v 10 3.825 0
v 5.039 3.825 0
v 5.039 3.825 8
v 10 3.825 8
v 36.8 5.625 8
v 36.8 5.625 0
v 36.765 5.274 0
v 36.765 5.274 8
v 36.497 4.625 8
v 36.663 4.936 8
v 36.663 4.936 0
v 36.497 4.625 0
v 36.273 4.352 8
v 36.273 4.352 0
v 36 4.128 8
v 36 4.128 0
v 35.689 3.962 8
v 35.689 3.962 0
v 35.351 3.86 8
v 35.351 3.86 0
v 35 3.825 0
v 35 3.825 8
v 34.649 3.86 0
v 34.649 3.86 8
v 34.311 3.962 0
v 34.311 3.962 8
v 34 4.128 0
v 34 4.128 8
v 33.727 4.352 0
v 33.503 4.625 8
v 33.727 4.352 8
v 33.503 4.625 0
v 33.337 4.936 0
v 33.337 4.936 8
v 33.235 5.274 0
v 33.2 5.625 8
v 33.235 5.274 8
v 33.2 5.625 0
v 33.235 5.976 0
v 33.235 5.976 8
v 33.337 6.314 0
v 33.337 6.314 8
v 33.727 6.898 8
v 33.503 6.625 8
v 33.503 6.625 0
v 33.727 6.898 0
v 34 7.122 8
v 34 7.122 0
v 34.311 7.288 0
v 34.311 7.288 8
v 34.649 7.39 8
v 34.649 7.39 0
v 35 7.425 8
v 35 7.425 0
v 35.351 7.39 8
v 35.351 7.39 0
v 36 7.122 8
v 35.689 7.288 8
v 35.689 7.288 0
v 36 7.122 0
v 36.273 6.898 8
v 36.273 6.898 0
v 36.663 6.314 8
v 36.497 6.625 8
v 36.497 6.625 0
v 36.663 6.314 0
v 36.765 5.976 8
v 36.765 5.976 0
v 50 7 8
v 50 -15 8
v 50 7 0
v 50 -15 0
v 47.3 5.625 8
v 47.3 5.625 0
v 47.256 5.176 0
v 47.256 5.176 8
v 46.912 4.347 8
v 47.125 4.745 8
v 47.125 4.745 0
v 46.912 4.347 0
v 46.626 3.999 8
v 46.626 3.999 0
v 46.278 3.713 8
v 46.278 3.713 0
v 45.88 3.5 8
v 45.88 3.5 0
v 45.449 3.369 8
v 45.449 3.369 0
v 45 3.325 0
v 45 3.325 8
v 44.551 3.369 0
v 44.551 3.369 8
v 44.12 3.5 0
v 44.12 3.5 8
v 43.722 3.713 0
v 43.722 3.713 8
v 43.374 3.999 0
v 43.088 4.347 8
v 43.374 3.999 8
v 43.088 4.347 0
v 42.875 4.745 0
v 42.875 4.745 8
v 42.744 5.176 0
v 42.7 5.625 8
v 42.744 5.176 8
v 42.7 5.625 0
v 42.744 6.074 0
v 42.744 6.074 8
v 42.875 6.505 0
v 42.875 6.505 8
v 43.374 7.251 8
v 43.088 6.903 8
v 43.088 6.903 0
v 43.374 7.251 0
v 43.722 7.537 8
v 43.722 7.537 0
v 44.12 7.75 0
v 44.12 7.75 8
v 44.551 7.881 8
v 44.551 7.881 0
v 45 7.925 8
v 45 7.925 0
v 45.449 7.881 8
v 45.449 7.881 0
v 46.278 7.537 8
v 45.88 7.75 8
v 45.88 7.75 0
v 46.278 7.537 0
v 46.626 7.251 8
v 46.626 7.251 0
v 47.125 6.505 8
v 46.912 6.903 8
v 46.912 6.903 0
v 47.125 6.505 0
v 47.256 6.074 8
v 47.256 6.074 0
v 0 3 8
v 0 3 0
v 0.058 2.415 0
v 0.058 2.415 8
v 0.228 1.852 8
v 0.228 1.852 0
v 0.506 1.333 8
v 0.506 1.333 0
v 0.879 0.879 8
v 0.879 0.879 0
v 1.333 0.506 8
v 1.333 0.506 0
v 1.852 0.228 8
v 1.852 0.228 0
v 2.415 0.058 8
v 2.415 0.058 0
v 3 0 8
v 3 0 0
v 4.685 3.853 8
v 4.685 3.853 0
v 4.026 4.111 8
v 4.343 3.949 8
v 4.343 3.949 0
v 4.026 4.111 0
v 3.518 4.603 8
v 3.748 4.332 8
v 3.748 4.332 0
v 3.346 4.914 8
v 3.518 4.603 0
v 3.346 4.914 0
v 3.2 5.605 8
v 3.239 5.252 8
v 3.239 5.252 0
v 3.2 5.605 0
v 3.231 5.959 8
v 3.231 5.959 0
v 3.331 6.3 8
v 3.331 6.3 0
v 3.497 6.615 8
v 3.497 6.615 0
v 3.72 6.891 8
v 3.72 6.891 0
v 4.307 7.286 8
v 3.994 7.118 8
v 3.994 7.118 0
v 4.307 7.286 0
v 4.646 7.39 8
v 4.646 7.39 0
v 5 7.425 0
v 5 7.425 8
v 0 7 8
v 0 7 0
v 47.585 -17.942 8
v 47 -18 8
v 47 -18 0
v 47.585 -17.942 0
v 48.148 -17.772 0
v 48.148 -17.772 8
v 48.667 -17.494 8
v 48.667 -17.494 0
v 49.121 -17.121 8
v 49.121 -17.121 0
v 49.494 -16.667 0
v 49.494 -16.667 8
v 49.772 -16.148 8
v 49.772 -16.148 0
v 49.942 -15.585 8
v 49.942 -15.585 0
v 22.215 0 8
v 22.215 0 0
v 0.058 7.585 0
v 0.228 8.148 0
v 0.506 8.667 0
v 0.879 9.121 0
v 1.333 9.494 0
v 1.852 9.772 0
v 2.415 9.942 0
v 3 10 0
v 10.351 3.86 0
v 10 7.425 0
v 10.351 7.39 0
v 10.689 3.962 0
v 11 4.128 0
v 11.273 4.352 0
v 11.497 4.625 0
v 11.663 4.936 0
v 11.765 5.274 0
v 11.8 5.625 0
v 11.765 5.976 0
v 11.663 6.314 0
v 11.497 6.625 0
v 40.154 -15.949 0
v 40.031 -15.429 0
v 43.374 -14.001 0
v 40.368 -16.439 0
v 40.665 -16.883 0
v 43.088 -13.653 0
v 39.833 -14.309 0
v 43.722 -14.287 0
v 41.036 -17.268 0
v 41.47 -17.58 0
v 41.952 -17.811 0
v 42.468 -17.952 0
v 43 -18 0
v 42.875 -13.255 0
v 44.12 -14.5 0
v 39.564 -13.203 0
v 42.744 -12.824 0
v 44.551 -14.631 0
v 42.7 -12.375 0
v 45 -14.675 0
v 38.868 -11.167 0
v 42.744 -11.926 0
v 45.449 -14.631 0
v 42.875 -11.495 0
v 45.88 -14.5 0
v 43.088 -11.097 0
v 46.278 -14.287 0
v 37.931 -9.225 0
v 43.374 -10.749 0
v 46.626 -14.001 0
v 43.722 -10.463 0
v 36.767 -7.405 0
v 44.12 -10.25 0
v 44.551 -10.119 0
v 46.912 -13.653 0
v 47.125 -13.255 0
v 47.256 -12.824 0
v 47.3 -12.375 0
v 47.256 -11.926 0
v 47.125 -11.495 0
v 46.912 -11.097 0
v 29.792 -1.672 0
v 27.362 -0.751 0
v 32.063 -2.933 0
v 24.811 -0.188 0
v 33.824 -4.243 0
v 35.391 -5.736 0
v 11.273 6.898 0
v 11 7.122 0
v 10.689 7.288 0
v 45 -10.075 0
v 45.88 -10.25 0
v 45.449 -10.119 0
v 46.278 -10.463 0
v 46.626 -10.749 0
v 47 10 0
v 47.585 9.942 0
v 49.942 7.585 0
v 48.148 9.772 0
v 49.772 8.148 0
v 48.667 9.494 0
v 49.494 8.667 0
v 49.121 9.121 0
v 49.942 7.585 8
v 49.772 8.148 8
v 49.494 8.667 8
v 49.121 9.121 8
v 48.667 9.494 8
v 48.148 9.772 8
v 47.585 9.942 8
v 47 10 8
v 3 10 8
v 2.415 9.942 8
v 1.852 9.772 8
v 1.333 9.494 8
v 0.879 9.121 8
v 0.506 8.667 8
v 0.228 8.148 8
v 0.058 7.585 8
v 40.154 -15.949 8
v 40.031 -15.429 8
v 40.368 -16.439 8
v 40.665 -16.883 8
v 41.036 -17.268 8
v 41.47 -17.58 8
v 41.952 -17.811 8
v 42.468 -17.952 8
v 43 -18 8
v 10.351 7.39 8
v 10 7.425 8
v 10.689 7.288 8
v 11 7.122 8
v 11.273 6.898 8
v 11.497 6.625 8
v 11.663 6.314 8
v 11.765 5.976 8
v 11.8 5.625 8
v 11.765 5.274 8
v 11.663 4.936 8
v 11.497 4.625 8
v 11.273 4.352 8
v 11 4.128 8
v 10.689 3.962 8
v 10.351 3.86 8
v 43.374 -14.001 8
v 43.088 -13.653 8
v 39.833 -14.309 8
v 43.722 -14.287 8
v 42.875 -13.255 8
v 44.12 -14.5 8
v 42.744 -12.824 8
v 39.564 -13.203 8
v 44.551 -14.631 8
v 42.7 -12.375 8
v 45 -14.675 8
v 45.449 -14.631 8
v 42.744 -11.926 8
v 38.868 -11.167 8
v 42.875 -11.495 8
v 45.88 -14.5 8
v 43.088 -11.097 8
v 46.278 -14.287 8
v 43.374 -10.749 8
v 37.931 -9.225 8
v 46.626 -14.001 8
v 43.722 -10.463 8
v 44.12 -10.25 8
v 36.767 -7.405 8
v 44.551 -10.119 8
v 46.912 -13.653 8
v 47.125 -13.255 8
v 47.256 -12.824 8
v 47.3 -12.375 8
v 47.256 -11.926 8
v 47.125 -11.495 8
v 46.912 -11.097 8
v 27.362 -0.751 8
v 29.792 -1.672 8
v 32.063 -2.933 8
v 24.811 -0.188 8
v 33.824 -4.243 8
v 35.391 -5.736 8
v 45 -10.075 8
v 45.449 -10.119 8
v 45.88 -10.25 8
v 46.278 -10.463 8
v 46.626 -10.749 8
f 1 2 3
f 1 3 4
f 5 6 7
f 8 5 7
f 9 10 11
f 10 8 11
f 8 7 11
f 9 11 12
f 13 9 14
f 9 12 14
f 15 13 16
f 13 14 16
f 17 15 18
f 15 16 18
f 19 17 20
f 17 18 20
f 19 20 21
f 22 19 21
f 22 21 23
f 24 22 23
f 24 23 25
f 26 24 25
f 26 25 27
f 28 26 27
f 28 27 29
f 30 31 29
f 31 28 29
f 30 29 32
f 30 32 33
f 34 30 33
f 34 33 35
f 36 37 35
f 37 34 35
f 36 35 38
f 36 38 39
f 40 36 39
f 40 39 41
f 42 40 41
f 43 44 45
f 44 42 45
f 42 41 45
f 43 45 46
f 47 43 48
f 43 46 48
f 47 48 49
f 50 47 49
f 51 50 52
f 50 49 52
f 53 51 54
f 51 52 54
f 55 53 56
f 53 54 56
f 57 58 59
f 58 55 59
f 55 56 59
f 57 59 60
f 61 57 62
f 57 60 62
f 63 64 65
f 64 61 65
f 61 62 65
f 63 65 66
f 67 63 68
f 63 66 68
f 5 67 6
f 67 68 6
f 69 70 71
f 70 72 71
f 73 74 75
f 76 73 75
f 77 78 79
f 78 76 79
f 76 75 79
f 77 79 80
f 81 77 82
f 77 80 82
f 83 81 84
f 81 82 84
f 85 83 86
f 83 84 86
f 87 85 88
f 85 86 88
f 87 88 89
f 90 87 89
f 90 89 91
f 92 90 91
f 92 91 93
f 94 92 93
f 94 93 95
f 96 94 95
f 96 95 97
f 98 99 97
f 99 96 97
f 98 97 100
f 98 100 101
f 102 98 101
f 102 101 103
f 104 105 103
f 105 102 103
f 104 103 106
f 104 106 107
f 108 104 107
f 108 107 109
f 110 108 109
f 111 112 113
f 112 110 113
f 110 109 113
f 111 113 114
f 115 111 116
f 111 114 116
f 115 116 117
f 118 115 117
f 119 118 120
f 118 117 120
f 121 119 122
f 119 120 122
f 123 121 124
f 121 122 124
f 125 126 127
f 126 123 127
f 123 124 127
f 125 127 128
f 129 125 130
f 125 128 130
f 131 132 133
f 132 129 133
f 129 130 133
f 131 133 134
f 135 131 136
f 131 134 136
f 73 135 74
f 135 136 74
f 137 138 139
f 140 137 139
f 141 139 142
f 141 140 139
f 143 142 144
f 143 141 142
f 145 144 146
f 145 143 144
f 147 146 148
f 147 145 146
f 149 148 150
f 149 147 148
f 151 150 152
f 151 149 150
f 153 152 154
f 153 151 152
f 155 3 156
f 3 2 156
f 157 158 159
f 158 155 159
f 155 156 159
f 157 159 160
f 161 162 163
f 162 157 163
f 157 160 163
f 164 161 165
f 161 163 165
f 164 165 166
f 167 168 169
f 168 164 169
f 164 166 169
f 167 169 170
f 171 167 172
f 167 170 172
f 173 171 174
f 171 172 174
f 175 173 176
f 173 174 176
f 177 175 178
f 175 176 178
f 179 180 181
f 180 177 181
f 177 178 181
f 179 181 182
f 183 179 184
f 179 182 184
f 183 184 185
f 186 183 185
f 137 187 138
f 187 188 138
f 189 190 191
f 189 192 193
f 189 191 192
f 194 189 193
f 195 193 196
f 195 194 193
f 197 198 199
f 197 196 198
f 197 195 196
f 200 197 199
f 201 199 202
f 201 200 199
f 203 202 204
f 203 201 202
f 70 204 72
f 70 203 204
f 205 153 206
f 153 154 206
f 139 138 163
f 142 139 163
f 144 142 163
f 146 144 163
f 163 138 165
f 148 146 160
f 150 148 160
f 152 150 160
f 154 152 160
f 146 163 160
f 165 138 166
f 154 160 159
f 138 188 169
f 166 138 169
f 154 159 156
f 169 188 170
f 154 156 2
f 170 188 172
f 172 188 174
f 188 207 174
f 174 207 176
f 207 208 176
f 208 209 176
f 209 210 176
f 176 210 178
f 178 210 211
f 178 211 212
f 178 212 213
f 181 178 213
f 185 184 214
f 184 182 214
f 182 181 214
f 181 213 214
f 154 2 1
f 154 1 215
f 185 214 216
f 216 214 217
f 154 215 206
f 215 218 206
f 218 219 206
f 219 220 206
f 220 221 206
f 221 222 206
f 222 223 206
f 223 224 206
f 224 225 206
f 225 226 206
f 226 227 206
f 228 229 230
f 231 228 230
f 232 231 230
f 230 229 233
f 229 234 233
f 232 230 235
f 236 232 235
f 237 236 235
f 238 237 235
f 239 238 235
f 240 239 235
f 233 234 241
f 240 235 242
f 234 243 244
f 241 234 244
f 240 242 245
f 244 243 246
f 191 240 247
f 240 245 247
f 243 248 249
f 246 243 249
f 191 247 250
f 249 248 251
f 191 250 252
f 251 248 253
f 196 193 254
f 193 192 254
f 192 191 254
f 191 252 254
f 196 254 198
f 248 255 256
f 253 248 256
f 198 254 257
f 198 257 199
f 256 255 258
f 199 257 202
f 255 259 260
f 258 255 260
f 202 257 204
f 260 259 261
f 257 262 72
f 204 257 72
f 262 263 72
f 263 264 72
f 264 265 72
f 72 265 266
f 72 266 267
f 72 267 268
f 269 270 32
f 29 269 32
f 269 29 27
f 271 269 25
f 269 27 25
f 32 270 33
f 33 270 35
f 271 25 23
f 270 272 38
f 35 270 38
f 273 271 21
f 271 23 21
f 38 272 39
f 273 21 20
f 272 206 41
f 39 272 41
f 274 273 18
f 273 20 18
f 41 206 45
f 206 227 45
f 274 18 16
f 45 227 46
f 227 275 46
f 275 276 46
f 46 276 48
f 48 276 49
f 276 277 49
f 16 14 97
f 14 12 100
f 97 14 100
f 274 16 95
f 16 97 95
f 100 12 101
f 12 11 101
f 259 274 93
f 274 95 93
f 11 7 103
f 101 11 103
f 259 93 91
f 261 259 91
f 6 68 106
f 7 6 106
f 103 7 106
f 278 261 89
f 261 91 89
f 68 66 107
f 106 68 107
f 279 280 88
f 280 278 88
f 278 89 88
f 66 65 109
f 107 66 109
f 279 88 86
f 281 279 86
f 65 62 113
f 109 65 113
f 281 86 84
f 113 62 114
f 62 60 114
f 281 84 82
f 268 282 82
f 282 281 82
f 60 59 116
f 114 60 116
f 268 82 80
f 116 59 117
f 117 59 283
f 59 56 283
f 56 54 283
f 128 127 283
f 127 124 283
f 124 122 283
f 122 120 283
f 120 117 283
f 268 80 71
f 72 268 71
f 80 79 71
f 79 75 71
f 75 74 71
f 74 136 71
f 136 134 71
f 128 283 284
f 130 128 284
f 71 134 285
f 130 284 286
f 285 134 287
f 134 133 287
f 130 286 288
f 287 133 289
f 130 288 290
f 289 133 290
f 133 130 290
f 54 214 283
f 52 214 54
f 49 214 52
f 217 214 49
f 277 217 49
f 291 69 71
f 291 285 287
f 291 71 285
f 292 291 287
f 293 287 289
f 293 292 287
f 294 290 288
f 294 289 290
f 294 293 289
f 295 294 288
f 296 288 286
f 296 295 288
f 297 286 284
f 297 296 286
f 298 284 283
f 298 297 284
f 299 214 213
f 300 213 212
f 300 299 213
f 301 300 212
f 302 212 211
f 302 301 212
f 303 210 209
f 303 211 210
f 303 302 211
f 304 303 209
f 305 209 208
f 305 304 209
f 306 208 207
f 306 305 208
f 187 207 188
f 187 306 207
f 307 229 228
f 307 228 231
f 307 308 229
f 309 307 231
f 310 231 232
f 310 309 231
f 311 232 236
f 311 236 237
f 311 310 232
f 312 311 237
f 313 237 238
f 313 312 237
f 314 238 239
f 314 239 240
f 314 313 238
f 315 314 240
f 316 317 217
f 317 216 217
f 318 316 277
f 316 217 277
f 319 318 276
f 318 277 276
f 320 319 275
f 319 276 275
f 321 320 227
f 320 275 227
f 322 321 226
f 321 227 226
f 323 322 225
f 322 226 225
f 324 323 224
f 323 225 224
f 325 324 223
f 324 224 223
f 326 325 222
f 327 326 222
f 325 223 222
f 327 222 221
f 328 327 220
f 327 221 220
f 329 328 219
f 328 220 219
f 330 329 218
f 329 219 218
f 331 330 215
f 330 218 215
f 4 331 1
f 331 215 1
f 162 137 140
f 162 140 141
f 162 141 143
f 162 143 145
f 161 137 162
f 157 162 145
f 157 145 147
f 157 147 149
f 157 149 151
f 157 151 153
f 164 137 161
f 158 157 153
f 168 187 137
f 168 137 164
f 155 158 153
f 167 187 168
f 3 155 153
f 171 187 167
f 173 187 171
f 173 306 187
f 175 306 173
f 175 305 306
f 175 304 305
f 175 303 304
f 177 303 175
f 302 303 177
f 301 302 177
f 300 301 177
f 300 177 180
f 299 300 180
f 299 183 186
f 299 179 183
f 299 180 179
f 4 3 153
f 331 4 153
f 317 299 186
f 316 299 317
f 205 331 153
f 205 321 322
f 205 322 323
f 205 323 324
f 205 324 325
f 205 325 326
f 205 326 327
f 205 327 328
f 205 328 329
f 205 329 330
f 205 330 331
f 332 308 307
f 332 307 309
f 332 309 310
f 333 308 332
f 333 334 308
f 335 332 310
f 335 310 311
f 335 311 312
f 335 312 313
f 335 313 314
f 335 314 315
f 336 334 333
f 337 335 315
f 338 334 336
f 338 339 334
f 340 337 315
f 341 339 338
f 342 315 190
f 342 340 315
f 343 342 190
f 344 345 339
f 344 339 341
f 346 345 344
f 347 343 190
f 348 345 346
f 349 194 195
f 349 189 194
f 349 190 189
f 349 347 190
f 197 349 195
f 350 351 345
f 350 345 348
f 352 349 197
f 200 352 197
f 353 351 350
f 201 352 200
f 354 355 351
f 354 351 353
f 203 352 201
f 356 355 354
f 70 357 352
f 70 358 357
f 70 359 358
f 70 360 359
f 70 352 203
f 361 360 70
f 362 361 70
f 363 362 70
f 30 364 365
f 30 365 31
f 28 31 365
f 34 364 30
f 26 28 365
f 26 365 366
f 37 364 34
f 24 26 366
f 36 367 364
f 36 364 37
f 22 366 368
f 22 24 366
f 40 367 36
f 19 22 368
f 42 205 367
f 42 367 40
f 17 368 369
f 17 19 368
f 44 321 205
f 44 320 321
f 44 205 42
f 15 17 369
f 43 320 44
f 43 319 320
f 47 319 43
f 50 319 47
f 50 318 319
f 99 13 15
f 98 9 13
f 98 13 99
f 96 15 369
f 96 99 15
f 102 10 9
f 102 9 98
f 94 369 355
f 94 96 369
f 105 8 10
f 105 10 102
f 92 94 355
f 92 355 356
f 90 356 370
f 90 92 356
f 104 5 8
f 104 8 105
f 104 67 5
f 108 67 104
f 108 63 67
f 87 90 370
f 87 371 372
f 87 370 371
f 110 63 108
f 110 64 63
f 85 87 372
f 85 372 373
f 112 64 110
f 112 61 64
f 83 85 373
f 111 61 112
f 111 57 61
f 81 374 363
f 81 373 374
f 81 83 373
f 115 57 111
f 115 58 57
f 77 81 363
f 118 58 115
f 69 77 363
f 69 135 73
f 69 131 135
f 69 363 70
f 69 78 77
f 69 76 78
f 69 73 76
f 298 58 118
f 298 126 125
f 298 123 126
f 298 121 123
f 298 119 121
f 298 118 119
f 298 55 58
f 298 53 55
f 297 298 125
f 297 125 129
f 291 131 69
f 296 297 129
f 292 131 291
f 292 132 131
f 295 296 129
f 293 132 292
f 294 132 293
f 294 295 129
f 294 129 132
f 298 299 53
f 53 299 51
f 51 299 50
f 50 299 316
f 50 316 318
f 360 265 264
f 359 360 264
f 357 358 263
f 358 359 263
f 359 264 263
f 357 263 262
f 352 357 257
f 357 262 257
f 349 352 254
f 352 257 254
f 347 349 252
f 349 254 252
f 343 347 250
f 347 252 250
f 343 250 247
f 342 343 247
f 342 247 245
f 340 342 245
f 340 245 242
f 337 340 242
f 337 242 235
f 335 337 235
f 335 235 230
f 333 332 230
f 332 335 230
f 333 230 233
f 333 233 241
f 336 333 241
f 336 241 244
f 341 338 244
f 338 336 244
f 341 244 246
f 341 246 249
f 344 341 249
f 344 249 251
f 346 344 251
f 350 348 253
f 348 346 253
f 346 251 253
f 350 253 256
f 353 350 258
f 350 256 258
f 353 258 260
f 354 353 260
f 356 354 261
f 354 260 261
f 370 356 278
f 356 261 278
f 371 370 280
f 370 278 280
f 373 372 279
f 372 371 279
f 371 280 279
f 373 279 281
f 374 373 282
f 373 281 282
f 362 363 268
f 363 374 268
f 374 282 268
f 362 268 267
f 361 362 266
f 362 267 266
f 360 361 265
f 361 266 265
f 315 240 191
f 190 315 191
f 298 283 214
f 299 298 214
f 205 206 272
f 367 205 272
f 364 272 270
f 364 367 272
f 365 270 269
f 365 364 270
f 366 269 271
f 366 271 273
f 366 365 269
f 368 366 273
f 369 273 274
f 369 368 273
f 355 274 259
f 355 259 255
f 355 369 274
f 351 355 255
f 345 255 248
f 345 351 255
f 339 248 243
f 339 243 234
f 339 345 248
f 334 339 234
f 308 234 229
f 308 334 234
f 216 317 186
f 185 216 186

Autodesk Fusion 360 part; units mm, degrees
sketch "Sketch1" plane through (0, 0, 0) normal (0, 0, 1) x (1, 0, 0)
  line L0 (0, 0) -> (50, 0)
  line L1 (50, 0) -> (50, 10)
  line L2 (50, 10) -> (0, 10)
  line L3 (0, 10) -> (0, 0)
  line L4 (50, 0) -> (40, 0)
  line L5 (40, 0) -> (40, -18)
  line L6 (40, -18) -> (50, -18)
  line L7 (50, -18) -> (50, 0)
  circle A0 centre (5, 5.625) radius 1.8
  circle A1 centre (35, 5.625) radius 1.8
  circle A2 centre (45, 5.625) radius 2.3
  circle A3 centre (45, -12.375) radius 2.3
  circle A4 centre (10, 5.625) radius 1.8
  line L8 (5.039, 3.8254) -> (10, 3.8254)
  line L9 (10, 7.425) -> (5, 7.425)
  dimension "d1" = 50
  dimension "d2" = 10
  dimension "d3" = 10
  dimension "d4" = 18
  dimension "d5" = 3.6
  dimension "d6" = 3.6
  dimension "d7" = 5
  dimension "d8" = 30
  dimension "d9" = 4.6
  dimension "d10" = 10
  dimension "d11" = 4.6
  dimension "d12" = 18
  dimension "d20" = 3.6
  dimension "d21" = 5.625
  dimension "d22" = 5
extrude "Extrude1" add sketch "Sketch1" along normal blind 8
fillet "Fillet1" radius 3 5 edges at (40, -18, 4) (50, -18, 4) (0, 0, 4) (50, 10, 4) (0, 10, 4)
fillet "Fillet2" radius 18 1 edges at (40, 0, 4)
chamfer "Chamfer1" [suppressed]
equation "d4 = d12"
equation "d6 = d5"
equation "d9 = d11"
equation "d20 = d5"
equation "d21 = 9 / 16 * d2"
